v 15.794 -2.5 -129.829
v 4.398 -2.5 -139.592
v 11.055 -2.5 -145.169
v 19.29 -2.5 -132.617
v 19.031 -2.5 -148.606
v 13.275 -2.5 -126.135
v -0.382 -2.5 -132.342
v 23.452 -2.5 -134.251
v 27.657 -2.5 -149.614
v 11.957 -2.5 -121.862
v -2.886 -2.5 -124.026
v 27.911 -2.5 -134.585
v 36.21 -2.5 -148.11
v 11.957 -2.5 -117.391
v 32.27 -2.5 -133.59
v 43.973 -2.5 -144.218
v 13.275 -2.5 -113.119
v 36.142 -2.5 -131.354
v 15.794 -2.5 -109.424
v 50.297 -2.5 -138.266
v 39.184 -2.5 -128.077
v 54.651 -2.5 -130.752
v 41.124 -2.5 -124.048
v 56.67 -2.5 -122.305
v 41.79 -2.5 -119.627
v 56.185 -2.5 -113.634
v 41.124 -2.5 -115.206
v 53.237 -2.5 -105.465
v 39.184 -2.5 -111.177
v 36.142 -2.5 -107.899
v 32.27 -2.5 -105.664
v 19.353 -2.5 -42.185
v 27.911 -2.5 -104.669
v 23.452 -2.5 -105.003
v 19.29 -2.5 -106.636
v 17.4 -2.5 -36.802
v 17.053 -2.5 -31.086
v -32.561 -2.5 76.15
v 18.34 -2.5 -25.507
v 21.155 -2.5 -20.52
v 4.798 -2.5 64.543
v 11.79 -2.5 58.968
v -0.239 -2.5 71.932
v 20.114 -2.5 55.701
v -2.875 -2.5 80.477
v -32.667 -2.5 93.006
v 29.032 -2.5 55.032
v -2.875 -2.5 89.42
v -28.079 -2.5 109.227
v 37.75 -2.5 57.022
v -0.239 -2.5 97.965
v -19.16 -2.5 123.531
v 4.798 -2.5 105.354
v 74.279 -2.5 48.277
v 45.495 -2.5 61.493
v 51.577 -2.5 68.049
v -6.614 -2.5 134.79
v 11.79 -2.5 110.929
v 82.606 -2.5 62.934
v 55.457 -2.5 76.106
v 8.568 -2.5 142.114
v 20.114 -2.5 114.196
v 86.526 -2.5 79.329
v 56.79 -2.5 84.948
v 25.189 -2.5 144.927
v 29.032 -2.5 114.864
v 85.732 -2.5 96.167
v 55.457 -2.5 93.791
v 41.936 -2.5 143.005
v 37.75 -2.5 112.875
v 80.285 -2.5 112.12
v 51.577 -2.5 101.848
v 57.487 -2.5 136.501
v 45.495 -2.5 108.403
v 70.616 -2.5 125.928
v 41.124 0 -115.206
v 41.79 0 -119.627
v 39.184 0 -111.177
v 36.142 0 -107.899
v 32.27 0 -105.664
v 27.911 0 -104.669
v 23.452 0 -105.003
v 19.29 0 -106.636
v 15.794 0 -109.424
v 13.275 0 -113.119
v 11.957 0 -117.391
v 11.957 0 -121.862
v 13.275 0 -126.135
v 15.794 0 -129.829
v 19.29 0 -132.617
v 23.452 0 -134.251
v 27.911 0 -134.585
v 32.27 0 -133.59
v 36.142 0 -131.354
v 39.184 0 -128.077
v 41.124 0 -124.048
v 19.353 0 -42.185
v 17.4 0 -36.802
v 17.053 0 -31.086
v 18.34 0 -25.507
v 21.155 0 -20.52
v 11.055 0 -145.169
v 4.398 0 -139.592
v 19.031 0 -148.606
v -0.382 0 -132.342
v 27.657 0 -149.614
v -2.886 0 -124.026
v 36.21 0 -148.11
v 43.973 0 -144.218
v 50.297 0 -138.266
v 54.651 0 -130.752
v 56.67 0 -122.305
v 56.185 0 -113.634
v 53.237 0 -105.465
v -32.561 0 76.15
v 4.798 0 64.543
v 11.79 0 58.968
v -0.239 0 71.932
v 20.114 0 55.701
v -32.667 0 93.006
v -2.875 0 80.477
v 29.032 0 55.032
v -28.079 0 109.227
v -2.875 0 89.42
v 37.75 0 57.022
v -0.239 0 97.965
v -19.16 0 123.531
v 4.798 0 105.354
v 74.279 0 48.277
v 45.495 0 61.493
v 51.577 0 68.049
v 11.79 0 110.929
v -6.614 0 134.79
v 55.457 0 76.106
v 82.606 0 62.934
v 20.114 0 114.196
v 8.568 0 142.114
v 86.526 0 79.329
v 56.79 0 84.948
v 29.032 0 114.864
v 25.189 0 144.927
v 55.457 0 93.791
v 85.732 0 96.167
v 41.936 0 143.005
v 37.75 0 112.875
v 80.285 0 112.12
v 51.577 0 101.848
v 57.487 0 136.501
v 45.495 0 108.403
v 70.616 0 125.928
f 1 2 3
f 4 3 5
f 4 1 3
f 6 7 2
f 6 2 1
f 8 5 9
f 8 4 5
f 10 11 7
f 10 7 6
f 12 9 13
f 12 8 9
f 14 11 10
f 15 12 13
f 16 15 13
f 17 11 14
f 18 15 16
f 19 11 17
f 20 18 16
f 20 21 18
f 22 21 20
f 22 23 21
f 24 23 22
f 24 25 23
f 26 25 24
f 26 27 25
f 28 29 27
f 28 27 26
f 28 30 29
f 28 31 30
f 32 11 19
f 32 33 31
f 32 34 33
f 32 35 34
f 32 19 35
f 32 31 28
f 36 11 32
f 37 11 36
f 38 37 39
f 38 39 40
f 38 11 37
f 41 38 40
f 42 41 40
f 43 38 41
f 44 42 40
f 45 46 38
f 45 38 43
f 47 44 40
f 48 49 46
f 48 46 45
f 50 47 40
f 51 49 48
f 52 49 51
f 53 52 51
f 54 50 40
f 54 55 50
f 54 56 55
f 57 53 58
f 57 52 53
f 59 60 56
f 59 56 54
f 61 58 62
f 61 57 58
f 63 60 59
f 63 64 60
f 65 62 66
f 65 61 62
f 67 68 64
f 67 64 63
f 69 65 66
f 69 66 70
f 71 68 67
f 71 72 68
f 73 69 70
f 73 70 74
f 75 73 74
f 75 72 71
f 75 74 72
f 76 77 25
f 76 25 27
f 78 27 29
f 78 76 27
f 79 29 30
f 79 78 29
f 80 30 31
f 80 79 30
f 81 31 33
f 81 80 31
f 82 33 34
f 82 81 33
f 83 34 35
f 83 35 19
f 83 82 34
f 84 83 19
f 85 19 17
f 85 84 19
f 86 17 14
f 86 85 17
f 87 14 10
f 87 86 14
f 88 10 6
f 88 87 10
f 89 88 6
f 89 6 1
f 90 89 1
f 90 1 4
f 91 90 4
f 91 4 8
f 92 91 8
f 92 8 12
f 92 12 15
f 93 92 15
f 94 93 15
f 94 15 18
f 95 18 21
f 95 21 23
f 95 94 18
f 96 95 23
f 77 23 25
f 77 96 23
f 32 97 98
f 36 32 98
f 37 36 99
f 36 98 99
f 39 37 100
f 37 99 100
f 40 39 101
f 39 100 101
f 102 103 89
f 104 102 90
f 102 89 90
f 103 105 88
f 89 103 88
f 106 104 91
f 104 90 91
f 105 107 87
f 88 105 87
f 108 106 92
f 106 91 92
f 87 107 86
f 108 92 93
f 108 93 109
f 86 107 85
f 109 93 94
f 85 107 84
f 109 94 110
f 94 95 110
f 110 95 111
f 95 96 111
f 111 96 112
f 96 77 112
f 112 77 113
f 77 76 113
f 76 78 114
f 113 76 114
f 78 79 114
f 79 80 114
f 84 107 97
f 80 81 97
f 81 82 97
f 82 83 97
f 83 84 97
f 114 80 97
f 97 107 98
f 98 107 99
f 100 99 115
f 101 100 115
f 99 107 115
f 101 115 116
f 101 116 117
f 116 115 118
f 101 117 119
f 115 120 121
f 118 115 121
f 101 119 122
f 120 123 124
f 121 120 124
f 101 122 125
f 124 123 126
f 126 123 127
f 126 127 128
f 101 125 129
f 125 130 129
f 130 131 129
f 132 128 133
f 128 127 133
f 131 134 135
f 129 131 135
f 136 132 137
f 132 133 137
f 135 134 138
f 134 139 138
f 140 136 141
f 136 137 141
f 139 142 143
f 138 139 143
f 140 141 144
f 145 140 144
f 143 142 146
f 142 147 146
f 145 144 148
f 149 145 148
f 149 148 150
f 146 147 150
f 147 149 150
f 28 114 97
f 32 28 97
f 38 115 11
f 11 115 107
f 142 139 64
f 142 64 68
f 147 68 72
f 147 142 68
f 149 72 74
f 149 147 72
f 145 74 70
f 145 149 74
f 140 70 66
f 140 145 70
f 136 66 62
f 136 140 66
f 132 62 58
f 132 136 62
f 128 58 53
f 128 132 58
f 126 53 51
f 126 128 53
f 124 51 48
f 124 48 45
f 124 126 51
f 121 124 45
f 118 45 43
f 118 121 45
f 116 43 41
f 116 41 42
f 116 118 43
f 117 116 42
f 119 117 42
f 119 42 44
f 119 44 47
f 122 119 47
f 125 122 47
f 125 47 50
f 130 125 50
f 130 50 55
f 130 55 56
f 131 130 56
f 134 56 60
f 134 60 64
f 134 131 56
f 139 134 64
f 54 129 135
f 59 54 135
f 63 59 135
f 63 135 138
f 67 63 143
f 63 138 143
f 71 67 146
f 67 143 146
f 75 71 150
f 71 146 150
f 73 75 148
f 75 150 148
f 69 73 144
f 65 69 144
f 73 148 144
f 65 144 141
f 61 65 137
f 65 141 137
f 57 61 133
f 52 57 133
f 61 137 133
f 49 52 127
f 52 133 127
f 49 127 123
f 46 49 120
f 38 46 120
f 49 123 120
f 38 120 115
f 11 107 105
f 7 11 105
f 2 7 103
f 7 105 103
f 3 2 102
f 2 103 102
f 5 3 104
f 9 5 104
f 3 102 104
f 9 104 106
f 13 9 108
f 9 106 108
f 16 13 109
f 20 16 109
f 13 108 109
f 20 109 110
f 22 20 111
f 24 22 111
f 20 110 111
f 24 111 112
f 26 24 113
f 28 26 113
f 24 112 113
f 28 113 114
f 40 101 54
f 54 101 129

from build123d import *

# Parameters (mm, degrees)
F0_R     = 15
F0_R_2   = 30
F1_DEPTH = 2.5


with BuildPart() as f1:
    # F0 (on Front) → F1 (new body)
    with BuildSketch(Plane.XZ):
        with BuildLine():
            Line((-32.561399, 76.149625), (-2.885725, -124.026205))
            ThreePointArc((-2.885725, -124.026205), (36.209669, -148.109627), (53.237161, -105.465454))
            Line((53.237161, -105.465454), (19.352906, -42.184657))
            ThreePointArc((19.352906, -42.184657), (17.053182, -31.086216), (21.154569, -20.520102))
            Line((21.154569, -20.520102), (74.279384, 48.277464))
            ThreePointArc((74.279384, 48.277464), (41.935595, 143.005296), (-32.561399, 76.149625))
        make_face()
        with Locations((26.789949, -119.626845)):
            Circle(F0_R, mode=Mode.SUBTRACT)
        with Locations((26.789949, 84.948346)):
            Circle(F0_R_2, mode=Mode.SUBTRACT)
    extrude(amount=F1_DEPTH)


solid = f1.part
